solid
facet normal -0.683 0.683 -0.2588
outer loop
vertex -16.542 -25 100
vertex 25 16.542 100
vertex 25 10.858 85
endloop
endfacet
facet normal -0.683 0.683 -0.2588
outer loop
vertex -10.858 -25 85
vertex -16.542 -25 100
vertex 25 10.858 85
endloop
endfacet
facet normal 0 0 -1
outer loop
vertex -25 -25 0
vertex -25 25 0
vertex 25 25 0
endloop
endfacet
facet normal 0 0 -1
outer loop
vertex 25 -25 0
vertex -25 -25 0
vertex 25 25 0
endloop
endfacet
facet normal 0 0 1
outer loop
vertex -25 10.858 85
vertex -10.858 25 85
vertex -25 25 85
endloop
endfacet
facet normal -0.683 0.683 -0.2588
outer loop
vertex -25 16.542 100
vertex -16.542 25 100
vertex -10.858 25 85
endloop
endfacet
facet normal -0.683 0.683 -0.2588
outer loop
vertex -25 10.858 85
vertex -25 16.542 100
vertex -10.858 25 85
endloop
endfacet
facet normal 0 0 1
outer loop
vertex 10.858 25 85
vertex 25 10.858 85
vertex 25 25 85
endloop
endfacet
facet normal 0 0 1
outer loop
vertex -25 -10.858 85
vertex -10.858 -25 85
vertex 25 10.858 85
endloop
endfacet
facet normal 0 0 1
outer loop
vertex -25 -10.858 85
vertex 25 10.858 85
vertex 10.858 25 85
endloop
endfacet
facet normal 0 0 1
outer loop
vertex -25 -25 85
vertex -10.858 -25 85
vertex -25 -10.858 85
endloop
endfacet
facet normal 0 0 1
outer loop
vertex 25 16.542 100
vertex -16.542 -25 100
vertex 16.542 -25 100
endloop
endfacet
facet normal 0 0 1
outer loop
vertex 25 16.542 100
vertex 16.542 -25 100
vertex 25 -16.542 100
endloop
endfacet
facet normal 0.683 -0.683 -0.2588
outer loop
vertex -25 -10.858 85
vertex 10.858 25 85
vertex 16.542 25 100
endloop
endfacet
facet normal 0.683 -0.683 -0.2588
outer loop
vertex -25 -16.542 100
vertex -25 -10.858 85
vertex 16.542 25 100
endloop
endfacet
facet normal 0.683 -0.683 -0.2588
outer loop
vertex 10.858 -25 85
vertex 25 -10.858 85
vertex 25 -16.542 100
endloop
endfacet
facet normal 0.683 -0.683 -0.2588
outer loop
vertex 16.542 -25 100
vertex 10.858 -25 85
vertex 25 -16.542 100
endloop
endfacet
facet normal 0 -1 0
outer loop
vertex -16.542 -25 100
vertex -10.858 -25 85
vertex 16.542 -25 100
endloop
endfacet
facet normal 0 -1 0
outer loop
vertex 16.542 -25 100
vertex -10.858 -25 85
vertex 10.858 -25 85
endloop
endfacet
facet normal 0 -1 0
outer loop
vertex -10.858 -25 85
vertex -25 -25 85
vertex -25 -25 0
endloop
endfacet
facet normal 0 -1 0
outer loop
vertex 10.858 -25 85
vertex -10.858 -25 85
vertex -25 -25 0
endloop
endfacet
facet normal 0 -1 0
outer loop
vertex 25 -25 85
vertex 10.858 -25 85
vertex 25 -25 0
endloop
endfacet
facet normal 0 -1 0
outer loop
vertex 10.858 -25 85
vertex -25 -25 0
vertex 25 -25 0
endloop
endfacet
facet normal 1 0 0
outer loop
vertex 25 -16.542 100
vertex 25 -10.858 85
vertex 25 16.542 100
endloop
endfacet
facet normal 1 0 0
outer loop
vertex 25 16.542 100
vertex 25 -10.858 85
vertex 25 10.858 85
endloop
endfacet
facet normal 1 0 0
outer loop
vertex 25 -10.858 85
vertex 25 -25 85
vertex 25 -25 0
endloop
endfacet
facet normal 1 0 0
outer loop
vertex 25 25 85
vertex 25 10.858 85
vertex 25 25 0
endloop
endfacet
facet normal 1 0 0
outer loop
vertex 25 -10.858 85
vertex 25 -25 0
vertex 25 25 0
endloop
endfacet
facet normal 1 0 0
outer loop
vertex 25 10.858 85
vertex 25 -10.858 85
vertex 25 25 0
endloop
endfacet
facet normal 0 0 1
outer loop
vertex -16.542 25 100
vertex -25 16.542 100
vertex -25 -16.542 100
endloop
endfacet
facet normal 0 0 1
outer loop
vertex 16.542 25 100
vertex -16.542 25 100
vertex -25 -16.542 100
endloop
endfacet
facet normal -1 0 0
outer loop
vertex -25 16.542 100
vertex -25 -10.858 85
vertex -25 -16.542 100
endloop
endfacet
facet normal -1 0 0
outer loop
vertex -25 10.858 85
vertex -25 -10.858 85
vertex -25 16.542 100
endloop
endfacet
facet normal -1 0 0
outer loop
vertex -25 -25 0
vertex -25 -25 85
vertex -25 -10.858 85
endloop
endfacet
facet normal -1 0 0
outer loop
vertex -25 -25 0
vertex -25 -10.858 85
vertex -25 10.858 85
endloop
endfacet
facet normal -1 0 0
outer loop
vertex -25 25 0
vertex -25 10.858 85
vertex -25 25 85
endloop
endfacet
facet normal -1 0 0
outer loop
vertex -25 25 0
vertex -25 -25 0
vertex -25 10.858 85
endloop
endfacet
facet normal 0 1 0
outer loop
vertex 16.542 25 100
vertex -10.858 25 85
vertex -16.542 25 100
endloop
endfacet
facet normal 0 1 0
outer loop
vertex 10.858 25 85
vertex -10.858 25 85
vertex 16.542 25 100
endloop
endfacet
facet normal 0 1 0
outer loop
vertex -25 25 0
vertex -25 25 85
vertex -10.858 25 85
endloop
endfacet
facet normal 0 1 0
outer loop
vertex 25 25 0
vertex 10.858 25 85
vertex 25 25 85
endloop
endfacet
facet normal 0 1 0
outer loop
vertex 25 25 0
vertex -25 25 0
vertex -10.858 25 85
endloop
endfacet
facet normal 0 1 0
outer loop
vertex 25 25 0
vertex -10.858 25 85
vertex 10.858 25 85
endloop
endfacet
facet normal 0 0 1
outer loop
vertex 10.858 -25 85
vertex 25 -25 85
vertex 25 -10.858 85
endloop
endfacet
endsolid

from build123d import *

# Parameters (mm, degrees)
F0_W     = 50
F0_H     = 50
F1_DEPTH = 100
F4_DEPTH = 50


with BuildPart() as f1:
    # F0 (on Top) → F1 (new body)
    with BuildSketch(Plane.XY):
        Rectangle(F0_W, F0_H)
    extrude(amount=F1_DEPTH)

    # F3 (on 3pt) → F4 (cut, symmetric)
    with BuildSketch(Plane(origin=(0, 0, 0), x_dir=(-0.7071067812, 0.7071067812, 0), z_dir=(0.7071067812, 0.7071067812, 0))):
        Polygon((10, 85), (5.9807621135, 100), (-5.9807621135, 100), (-10, 85), align=None)
        Polygon((45.3553390593, 85), (41.3361011729, 100), (29.3745769458, 100), (25.3553390593, 85), align=None)
        Polygon((-25.3553390593, 85), (-29.3745769458, 100), (-41.3361011729, 100), (-45.3553390593, 85), align=None)
    extrude(amount=F4_DEPTH, both=True, mode=Mode.SUBTRACT)


solid = f1.part
